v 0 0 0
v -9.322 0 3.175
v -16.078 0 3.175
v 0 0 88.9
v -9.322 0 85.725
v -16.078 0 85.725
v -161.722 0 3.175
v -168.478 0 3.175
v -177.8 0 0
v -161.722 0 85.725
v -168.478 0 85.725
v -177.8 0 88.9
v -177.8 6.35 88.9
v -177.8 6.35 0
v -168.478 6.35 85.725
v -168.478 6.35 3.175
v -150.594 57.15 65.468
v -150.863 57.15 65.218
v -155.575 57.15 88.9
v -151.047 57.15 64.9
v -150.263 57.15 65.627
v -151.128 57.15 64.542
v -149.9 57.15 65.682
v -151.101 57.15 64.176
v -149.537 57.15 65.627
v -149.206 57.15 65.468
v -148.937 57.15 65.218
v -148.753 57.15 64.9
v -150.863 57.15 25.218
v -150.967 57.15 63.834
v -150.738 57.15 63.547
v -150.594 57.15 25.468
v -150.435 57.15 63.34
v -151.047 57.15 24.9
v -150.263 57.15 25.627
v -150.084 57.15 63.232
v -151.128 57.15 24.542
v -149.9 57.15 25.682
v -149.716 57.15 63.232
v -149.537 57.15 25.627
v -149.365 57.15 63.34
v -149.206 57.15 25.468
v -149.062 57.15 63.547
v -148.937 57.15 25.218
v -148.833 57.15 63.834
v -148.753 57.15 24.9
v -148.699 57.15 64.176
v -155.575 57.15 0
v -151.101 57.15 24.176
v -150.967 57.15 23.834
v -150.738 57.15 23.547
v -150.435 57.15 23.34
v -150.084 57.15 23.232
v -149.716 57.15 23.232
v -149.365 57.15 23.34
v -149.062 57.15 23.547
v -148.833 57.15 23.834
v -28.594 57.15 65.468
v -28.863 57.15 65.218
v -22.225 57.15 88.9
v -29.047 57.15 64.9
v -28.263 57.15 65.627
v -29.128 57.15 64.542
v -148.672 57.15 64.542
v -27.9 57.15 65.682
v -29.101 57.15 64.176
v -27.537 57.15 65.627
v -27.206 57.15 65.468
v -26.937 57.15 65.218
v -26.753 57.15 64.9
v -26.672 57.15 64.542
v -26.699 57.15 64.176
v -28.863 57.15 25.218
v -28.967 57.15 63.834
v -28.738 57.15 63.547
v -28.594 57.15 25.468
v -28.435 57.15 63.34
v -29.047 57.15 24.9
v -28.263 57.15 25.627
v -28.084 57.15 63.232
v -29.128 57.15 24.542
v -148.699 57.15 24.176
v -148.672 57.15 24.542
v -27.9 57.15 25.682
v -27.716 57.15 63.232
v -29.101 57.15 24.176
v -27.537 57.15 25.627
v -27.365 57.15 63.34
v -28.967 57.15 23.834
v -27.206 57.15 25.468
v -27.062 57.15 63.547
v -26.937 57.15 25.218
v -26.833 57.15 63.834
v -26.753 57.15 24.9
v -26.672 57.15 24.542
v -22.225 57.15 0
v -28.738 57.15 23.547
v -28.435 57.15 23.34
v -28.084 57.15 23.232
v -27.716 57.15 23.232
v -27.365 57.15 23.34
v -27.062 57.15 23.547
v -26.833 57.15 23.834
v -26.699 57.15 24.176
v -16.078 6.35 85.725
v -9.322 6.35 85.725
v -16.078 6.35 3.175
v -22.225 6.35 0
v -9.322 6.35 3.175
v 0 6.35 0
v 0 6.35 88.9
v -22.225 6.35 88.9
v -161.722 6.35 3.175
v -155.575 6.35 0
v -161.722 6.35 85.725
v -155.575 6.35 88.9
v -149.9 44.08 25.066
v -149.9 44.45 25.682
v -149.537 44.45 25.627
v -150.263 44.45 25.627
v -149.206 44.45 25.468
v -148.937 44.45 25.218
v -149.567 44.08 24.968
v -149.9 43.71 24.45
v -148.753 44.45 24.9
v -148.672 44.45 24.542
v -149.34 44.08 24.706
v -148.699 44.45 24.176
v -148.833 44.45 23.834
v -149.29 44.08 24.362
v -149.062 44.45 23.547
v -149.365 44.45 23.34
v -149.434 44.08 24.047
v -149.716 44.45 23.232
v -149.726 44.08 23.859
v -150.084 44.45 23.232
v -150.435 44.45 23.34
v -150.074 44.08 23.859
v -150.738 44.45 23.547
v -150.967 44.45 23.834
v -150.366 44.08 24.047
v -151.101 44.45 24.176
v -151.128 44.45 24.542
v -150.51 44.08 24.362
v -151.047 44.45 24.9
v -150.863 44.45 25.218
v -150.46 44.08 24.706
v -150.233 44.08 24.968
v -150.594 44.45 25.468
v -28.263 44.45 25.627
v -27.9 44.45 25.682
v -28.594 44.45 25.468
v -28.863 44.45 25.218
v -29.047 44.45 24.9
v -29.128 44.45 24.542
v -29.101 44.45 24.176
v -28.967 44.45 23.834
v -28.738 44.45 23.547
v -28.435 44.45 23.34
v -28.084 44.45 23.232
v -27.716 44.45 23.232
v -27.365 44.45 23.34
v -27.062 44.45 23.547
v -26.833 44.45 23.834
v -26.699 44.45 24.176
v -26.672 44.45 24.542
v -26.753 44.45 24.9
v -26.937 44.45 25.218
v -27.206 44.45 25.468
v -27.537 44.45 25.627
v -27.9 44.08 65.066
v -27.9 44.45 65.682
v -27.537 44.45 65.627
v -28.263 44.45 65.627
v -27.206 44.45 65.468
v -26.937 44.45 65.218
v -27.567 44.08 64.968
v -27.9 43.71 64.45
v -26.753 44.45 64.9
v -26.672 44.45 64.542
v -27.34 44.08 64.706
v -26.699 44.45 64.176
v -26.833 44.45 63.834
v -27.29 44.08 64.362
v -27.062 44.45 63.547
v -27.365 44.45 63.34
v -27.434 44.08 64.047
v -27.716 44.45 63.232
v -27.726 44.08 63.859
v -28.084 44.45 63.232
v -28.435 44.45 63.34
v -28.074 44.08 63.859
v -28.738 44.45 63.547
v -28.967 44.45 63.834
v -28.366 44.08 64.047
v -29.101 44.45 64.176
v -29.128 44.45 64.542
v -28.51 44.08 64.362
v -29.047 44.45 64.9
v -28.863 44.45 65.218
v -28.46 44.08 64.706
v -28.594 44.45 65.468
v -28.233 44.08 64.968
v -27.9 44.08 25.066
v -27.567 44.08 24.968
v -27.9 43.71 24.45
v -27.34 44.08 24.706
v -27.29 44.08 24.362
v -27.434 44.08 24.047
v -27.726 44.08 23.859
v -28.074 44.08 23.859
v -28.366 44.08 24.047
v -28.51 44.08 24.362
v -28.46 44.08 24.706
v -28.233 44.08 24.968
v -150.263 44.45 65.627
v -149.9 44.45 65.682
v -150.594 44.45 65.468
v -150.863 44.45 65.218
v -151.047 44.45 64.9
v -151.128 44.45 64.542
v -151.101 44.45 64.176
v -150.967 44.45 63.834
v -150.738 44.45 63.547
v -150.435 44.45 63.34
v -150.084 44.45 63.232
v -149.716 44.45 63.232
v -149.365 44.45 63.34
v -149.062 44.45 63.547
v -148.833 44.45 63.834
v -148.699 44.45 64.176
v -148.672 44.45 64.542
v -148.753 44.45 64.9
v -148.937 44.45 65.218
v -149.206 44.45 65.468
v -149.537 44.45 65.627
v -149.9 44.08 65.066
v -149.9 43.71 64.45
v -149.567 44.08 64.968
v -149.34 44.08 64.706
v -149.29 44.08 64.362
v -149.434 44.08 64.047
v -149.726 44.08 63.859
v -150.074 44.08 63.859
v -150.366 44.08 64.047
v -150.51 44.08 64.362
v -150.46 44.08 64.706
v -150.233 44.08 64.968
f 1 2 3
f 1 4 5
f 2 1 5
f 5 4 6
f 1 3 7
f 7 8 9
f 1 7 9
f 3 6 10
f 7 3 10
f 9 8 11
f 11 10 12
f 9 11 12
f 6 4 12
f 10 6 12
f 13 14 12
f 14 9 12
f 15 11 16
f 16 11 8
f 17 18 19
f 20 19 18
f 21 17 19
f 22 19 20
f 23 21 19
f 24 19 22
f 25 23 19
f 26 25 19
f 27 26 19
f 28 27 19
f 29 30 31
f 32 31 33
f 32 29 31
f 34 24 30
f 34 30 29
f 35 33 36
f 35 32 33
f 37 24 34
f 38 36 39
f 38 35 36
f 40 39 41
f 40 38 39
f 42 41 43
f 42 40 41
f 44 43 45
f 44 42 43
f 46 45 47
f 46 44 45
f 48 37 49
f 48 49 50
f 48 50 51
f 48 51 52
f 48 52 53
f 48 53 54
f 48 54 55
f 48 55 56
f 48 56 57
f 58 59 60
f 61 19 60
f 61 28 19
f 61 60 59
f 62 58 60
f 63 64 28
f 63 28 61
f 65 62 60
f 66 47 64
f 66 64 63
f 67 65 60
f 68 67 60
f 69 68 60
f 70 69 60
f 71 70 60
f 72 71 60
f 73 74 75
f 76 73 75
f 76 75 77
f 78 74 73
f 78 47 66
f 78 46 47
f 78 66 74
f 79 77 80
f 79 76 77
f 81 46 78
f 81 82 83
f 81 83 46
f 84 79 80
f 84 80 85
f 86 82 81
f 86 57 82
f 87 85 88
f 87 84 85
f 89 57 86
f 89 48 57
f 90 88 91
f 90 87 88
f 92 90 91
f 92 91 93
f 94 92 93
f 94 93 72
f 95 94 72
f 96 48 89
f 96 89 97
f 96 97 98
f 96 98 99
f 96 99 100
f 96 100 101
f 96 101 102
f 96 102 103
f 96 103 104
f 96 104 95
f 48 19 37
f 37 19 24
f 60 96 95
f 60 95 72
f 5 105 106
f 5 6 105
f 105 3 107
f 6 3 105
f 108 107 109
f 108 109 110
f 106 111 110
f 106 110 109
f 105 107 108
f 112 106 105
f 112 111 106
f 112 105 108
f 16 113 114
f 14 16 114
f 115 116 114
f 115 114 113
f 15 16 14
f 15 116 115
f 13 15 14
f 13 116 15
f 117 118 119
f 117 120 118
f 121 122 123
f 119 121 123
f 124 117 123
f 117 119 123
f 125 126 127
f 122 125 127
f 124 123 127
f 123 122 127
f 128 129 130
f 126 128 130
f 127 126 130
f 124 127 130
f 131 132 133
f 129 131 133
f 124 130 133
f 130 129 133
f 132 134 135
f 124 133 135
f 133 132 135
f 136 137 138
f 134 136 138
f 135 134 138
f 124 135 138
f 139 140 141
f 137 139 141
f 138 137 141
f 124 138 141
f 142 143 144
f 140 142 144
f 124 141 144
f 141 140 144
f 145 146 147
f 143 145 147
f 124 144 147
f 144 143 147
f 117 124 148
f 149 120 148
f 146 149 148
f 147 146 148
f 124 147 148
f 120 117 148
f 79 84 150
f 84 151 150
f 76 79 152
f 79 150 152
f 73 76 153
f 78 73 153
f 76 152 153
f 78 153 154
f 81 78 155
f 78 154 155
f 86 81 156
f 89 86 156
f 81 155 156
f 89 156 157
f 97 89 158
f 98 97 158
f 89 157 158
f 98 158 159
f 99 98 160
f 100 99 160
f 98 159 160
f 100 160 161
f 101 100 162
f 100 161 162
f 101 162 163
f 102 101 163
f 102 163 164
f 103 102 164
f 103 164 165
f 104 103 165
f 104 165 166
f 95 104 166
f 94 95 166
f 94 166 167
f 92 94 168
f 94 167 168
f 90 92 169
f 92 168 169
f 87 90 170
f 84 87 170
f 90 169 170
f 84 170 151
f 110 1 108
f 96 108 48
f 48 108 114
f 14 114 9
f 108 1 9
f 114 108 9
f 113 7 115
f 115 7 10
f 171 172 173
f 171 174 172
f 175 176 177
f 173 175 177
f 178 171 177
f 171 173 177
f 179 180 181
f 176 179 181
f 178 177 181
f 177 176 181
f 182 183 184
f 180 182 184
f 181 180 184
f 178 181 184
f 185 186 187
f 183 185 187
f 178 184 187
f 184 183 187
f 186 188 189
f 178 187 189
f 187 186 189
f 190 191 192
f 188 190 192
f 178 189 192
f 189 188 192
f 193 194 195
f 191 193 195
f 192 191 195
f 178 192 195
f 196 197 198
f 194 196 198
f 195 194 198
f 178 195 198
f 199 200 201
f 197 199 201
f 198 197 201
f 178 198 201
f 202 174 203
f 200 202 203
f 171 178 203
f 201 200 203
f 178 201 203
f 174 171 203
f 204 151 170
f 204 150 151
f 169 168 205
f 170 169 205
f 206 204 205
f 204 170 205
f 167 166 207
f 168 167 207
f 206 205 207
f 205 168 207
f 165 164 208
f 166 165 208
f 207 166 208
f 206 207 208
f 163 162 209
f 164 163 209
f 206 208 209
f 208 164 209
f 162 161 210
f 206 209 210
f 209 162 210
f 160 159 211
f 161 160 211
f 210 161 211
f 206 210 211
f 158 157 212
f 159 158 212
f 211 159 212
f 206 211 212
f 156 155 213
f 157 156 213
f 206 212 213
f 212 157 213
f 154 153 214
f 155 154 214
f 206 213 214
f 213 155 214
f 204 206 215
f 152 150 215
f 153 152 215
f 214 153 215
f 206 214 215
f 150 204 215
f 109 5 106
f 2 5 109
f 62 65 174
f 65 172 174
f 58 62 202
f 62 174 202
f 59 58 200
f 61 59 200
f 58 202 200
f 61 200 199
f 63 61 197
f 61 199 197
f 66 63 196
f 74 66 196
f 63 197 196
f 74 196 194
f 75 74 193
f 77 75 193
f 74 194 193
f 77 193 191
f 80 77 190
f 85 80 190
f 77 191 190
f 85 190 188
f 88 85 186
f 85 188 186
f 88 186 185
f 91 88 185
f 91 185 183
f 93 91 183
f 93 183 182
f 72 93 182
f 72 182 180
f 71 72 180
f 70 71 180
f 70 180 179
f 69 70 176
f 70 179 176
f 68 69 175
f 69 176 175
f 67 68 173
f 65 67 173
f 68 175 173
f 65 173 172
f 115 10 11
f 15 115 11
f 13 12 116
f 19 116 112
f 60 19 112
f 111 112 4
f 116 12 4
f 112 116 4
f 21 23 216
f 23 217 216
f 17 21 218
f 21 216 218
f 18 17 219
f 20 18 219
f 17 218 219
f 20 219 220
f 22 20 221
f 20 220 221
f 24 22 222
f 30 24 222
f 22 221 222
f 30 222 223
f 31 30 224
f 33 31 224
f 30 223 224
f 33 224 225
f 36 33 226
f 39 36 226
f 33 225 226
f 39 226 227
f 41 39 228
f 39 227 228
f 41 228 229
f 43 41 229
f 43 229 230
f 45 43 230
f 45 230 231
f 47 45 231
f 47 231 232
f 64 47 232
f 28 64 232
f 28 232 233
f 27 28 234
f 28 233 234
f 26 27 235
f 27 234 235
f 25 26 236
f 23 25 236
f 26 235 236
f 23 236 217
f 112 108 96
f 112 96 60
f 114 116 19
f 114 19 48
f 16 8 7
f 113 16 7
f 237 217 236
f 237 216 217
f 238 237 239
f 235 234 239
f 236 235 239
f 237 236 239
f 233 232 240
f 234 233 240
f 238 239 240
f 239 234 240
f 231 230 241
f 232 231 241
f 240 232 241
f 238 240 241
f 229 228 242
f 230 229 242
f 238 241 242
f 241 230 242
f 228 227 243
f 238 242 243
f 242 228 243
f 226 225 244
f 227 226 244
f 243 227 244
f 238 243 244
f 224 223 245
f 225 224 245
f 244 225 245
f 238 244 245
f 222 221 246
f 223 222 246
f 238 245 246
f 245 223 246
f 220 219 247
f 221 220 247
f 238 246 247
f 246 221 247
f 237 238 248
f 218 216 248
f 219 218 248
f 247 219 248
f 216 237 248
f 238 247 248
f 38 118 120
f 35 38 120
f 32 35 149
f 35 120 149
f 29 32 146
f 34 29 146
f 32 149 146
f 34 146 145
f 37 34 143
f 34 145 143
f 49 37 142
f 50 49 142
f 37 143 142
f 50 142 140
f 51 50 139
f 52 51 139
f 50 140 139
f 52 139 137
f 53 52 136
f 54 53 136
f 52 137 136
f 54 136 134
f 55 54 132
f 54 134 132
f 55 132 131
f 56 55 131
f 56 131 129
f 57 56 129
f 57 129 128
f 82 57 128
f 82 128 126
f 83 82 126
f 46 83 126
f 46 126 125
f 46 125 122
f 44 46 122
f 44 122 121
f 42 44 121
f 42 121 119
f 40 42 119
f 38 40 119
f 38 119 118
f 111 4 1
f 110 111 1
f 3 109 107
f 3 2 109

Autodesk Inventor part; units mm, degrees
ref_plane "YZ Plane" through (0, 0, 0) normal (1, 0, 0) x (0, 1, 0)
ref_plane "XZ Plane" through (0, 0, 0) normal (0, 1, 0) x (-1, 0, 0)
ref_plane "XY Plane" through (0, 0, 0) normal (0, 0, 1) x (1, 0, 0)
sketch "Sketch1" plane through (0, 0, 0) normal (0, 1, 0) x (-1, 0, 0)
  line L0 (0, 0) -> (177.8, 0)
  line L1 (177.8, 0) -> (177.8, 88.9)
  line L2 (177.8, 88.9) -> (0, 88.9)
  line L3 (0, 88.9) -> (0, 0)
  line L4 (9.3218, 3.175) -> (16.0782, 3.175)
  line L5 (16.0782, 3.175) -> (16.0782, 85.725)
  line L6 (16.0782, 85.725) -> (9.3218, 85.725)
  line L7 (9.3218, 85.725) -> (9.3218, 3.175)
  line L8 (9.3218, 3.175) -> (16.0782, 85.725) construction
  line L9 (16.0782, 3.175) -> (9.3218, 85.725) construction
  line L10 (168.4782, 3.175) -> (161.7218, 3.175)
  line L11 (161.7218, 3.175) -> (161.7218, 85.725)
  line L12 (161.7218, 85.725) -> (168.4782, 85.725)
  line L13 (168.4782, 85.725) -> (168.4782, 3.175)
  line L14 (168.4782, 3.175) -> (161.7218, 85.725) construction
  line L15 (161.7218, 3.175) -> (168.4782, 85.725) construction
  point P0 (12.7, 44.45)
  point P1 (165.1, 44.45)
  dimension "d0" = 177.8
  dimension "d1" = 88.9
  dimension "d2" = 6.7564
  dimension "d3" = 82.55
  dimension "d4" = 6.7564
  dimension "d5" = 82.55
extrude "Extrusion1" add sketch "Sketch1" along normal blind 6.35
sketch "Sketch2" plane through (0, 6.35, 0) normal (0, 1, 0) x (1, 0, 0)
  line L0 (-155.575, 0) -> (-22.225, 0)
  line L1 (-22.225, 0) -> (-22.225, -88.9)
  line L2 (-22.225, -88.9) -> (-155.575, -88.9)
  line L3 (-155.575, -88.9) -> (-155.575, 0)
  line L4 (-155.575, 0) -> (-22.225, -88.9) construction
  line L5 (-22.225, 0) -> (-155.575, -88.9) construction
  point P0 (-88.9, -44.45)
  dimension "d8" = 133.35
  dimension "d9" = 88.9
extrude "Extrusion2" add sketch "Sketch2" along normal blind 50.8
sketch "Sketch3" plane through (0, 57.15, 0) normal (0, 1, 0) x (1, 0, 0)
  line L0 (-149.9, -64.45) -> (-27.9, -64.45)
  line L1 (-27.9, -64.45) -> (-27.9, -24.45)
  line L2 (-27.9, -24.45) -> (-149.9, -24.45)
  line L3 (-149.9, -24.45) -> (-149.9, -64.45)
  line L4 (-149.9, -64.45) -> (-27.9, -24.45) construction
  line L5 (-27.9, -64.45) -> (-149.9, -24.45) construction
  point P0 (0, 0)
  point P1 (-88.9, -44.45)
  dimension "d12" = 122
  dimension "d13" = 40
hole "Hole1" at (-149.9, 57.15, 24.45) at (-149.9, 57.15, 64.45) at (-27.9, 57.15, 24.45) at (-27.9, 57.15, 64.45) direction (0, -1, 0) diameter 2.4638 depth 12.7 tip angle 118
properties part number "MPB561LaserMount"
